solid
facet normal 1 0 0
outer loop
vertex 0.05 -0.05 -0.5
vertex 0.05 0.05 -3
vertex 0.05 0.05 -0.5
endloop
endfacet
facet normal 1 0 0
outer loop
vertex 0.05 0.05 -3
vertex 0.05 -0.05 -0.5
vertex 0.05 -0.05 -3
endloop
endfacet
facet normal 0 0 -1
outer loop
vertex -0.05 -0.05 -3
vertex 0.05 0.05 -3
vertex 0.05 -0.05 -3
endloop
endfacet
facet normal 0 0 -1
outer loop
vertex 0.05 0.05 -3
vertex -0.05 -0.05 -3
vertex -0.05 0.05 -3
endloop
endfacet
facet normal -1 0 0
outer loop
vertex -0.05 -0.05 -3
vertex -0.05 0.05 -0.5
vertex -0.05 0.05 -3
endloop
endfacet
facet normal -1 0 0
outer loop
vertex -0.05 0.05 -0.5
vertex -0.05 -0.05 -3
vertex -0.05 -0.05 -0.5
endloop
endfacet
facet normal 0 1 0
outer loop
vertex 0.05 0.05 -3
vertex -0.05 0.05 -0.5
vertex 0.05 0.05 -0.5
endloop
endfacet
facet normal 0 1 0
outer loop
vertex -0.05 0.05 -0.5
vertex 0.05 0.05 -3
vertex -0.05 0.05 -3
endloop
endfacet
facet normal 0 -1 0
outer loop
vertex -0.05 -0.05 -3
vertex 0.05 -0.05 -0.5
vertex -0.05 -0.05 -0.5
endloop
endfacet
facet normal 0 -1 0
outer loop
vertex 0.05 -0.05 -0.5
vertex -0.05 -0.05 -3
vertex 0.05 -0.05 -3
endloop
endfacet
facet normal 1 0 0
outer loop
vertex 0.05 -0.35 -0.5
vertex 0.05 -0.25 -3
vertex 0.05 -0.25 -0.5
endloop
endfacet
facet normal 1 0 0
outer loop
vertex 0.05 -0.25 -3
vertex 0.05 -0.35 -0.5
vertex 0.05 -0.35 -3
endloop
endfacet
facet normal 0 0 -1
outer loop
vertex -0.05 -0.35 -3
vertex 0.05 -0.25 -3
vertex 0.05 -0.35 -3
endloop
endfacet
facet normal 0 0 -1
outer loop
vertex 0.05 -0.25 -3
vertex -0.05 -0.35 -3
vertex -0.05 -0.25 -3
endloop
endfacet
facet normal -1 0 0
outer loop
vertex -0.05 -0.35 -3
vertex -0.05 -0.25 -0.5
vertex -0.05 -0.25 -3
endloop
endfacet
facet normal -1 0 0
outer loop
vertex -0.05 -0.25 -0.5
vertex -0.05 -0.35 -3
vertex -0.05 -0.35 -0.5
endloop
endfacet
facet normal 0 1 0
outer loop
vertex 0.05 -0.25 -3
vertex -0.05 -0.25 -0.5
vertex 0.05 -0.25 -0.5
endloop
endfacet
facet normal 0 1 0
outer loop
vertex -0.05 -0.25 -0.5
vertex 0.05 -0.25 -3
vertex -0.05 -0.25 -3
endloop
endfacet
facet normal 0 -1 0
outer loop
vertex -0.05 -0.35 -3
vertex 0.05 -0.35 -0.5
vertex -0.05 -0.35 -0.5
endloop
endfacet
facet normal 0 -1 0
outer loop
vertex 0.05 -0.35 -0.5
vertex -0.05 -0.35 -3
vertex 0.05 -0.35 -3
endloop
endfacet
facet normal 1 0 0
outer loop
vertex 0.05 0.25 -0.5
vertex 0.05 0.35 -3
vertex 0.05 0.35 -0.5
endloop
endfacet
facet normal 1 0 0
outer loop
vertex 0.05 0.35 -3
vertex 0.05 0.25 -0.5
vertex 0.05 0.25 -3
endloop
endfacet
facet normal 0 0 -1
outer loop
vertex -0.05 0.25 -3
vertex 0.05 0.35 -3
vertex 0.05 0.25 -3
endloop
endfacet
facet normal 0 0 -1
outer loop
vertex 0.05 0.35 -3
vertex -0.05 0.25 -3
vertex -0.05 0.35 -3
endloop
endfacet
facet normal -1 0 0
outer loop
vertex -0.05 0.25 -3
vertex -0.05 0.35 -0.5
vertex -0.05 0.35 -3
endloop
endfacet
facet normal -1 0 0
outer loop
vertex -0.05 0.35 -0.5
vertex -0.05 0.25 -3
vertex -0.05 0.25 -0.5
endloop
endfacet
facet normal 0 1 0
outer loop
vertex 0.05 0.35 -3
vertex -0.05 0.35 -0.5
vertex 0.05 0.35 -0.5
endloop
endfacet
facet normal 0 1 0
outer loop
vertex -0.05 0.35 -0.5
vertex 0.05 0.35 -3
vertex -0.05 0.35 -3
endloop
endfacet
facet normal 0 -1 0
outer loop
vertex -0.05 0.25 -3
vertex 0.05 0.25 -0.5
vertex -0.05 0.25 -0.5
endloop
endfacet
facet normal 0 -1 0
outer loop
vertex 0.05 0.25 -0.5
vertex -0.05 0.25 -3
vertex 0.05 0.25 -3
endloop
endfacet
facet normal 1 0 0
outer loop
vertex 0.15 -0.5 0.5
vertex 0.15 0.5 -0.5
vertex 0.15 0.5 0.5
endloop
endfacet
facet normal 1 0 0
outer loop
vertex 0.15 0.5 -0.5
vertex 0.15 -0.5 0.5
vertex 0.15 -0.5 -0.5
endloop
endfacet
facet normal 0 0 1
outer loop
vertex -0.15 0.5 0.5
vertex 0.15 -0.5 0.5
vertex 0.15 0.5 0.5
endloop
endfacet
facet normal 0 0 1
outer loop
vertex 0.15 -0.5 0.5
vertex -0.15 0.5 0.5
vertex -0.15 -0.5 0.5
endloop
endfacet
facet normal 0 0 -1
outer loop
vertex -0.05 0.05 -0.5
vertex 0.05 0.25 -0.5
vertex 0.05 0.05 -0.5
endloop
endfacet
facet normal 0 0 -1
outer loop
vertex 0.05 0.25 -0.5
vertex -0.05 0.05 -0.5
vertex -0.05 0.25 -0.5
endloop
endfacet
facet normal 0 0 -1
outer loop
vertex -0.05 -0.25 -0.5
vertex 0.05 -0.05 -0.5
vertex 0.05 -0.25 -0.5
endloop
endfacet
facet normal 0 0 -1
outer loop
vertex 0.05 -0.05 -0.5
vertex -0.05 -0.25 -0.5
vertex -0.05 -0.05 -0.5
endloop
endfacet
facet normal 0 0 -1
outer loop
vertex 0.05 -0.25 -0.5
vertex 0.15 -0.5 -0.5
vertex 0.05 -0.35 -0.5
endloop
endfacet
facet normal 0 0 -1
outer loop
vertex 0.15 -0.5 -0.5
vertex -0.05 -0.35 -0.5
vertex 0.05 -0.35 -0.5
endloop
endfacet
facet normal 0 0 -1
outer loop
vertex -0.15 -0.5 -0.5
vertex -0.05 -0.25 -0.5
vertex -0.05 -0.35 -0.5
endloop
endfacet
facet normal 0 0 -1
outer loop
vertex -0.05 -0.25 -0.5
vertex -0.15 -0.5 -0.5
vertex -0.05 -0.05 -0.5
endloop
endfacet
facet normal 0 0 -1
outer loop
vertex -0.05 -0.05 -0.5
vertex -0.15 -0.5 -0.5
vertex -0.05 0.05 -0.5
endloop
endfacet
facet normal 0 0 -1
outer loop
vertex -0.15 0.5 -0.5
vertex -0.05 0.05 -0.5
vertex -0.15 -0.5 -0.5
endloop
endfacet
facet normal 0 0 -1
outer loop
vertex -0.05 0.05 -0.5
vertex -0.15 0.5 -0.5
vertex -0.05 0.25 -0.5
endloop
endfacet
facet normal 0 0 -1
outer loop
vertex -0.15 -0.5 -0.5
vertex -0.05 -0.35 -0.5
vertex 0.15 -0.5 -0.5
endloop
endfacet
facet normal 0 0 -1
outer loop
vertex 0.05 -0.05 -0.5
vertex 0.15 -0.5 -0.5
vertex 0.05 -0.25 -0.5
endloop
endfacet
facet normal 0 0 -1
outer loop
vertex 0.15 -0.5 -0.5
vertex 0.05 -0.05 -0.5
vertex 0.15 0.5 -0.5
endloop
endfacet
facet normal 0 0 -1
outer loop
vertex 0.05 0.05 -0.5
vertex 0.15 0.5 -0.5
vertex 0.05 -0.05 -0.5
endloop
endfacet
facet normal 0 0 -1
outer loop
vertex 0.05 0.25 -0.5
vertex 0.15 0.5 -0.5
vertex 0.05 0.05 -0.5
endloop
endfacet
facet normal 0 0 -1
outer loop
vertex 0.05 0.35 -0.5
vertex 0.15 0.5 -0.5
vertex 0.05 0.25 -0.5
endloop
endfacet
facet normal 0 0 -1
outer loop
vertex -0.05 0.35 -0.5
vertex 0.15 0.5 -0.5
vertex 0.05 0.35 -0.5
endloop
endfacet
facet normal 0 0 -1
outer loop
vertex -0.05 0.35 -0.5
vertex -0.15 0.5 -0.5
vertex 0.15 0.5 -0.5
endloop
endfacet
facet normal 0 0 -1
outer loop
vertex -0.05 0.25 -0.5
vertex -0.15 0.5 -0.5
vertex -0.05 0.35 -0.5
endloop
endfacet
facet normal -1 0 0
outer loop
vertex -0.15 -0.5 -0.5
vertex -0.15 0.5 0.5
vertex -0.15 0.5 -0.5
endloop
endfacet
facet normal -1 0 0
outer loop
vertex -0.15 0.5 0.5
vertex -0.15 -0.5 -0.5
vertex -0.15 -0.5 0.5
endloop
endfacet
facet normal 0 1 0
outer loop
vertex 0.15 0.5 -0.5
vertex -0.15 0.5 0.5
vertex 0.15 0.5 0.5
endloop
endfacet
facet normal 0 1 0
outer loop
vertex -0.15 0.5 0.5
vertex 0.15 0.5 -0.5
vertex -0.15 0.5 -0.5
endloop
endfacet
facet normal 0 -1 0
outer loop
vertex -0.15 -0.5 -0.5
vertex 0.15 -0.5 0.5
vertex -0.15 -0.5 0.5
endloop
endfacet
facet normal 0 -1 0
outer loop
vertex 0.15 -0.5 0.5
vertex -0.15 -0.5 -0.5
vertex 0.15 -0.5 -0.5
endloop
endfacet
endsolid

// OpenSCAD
module Transistor(){ 
    color("black")  
    cube([0.3,1,1], center = true);

    color("gray"){  
    translate([0,0,-1.5])
    cube([0.1,0.1,3], center = true);

    translate([0,-0.3,-1.5])
    cube([0.1,0.1,3], center = true);

    translate([0,0.3,-1.5])
    cube([0.1,0.1,3], center = true);
    }
}


Transistor();


// Written by Nicolì Angelo (Gengio) 2024: 
// MIT License

//Permission is hereby granted, free of charge, to any person obtaining a copy of this software and associated documentation files (the "Software"), to deal in the Software without restriction, including without limitation the rights to use, copy, modify, merge, publish, distribute, sublicense, and/or sell copies of the Software, and to permit persons to whom the Software is furnished to do so, subject to the following conditions:

//The above copyright notice and this permission notice shall be included in all copies or substantial portions of the Software.

//THE SOFTWARE IS PROVIDED "AS IS", WITHOUT WARRANTY OF ANY KIND, EXPRESS OR IMPLIED, INCLUDING BUT NOT LIMITED TO THE WARRANTIES OF MERCHANTABILITY, FITNESS FOR A PARTICULAR PURPOSE AND NONINFRINGEMENT. IN NO EVENT SHALL THE AUTHORS OR COPYRIGHT HOLDERS BE LIABLE FOR ANY CLAIM, DAMAGES OR OTHER LIABILITY, WHETHER IN AN ACTION OF CONTRACT, TORT OR OTHERWISE, ARISING FROM, OUT OF OR IN CONNECTION WITH THE SOFTWARE OR THE USE OR OTHER DEALINGS IN THE SOFTWARE.
